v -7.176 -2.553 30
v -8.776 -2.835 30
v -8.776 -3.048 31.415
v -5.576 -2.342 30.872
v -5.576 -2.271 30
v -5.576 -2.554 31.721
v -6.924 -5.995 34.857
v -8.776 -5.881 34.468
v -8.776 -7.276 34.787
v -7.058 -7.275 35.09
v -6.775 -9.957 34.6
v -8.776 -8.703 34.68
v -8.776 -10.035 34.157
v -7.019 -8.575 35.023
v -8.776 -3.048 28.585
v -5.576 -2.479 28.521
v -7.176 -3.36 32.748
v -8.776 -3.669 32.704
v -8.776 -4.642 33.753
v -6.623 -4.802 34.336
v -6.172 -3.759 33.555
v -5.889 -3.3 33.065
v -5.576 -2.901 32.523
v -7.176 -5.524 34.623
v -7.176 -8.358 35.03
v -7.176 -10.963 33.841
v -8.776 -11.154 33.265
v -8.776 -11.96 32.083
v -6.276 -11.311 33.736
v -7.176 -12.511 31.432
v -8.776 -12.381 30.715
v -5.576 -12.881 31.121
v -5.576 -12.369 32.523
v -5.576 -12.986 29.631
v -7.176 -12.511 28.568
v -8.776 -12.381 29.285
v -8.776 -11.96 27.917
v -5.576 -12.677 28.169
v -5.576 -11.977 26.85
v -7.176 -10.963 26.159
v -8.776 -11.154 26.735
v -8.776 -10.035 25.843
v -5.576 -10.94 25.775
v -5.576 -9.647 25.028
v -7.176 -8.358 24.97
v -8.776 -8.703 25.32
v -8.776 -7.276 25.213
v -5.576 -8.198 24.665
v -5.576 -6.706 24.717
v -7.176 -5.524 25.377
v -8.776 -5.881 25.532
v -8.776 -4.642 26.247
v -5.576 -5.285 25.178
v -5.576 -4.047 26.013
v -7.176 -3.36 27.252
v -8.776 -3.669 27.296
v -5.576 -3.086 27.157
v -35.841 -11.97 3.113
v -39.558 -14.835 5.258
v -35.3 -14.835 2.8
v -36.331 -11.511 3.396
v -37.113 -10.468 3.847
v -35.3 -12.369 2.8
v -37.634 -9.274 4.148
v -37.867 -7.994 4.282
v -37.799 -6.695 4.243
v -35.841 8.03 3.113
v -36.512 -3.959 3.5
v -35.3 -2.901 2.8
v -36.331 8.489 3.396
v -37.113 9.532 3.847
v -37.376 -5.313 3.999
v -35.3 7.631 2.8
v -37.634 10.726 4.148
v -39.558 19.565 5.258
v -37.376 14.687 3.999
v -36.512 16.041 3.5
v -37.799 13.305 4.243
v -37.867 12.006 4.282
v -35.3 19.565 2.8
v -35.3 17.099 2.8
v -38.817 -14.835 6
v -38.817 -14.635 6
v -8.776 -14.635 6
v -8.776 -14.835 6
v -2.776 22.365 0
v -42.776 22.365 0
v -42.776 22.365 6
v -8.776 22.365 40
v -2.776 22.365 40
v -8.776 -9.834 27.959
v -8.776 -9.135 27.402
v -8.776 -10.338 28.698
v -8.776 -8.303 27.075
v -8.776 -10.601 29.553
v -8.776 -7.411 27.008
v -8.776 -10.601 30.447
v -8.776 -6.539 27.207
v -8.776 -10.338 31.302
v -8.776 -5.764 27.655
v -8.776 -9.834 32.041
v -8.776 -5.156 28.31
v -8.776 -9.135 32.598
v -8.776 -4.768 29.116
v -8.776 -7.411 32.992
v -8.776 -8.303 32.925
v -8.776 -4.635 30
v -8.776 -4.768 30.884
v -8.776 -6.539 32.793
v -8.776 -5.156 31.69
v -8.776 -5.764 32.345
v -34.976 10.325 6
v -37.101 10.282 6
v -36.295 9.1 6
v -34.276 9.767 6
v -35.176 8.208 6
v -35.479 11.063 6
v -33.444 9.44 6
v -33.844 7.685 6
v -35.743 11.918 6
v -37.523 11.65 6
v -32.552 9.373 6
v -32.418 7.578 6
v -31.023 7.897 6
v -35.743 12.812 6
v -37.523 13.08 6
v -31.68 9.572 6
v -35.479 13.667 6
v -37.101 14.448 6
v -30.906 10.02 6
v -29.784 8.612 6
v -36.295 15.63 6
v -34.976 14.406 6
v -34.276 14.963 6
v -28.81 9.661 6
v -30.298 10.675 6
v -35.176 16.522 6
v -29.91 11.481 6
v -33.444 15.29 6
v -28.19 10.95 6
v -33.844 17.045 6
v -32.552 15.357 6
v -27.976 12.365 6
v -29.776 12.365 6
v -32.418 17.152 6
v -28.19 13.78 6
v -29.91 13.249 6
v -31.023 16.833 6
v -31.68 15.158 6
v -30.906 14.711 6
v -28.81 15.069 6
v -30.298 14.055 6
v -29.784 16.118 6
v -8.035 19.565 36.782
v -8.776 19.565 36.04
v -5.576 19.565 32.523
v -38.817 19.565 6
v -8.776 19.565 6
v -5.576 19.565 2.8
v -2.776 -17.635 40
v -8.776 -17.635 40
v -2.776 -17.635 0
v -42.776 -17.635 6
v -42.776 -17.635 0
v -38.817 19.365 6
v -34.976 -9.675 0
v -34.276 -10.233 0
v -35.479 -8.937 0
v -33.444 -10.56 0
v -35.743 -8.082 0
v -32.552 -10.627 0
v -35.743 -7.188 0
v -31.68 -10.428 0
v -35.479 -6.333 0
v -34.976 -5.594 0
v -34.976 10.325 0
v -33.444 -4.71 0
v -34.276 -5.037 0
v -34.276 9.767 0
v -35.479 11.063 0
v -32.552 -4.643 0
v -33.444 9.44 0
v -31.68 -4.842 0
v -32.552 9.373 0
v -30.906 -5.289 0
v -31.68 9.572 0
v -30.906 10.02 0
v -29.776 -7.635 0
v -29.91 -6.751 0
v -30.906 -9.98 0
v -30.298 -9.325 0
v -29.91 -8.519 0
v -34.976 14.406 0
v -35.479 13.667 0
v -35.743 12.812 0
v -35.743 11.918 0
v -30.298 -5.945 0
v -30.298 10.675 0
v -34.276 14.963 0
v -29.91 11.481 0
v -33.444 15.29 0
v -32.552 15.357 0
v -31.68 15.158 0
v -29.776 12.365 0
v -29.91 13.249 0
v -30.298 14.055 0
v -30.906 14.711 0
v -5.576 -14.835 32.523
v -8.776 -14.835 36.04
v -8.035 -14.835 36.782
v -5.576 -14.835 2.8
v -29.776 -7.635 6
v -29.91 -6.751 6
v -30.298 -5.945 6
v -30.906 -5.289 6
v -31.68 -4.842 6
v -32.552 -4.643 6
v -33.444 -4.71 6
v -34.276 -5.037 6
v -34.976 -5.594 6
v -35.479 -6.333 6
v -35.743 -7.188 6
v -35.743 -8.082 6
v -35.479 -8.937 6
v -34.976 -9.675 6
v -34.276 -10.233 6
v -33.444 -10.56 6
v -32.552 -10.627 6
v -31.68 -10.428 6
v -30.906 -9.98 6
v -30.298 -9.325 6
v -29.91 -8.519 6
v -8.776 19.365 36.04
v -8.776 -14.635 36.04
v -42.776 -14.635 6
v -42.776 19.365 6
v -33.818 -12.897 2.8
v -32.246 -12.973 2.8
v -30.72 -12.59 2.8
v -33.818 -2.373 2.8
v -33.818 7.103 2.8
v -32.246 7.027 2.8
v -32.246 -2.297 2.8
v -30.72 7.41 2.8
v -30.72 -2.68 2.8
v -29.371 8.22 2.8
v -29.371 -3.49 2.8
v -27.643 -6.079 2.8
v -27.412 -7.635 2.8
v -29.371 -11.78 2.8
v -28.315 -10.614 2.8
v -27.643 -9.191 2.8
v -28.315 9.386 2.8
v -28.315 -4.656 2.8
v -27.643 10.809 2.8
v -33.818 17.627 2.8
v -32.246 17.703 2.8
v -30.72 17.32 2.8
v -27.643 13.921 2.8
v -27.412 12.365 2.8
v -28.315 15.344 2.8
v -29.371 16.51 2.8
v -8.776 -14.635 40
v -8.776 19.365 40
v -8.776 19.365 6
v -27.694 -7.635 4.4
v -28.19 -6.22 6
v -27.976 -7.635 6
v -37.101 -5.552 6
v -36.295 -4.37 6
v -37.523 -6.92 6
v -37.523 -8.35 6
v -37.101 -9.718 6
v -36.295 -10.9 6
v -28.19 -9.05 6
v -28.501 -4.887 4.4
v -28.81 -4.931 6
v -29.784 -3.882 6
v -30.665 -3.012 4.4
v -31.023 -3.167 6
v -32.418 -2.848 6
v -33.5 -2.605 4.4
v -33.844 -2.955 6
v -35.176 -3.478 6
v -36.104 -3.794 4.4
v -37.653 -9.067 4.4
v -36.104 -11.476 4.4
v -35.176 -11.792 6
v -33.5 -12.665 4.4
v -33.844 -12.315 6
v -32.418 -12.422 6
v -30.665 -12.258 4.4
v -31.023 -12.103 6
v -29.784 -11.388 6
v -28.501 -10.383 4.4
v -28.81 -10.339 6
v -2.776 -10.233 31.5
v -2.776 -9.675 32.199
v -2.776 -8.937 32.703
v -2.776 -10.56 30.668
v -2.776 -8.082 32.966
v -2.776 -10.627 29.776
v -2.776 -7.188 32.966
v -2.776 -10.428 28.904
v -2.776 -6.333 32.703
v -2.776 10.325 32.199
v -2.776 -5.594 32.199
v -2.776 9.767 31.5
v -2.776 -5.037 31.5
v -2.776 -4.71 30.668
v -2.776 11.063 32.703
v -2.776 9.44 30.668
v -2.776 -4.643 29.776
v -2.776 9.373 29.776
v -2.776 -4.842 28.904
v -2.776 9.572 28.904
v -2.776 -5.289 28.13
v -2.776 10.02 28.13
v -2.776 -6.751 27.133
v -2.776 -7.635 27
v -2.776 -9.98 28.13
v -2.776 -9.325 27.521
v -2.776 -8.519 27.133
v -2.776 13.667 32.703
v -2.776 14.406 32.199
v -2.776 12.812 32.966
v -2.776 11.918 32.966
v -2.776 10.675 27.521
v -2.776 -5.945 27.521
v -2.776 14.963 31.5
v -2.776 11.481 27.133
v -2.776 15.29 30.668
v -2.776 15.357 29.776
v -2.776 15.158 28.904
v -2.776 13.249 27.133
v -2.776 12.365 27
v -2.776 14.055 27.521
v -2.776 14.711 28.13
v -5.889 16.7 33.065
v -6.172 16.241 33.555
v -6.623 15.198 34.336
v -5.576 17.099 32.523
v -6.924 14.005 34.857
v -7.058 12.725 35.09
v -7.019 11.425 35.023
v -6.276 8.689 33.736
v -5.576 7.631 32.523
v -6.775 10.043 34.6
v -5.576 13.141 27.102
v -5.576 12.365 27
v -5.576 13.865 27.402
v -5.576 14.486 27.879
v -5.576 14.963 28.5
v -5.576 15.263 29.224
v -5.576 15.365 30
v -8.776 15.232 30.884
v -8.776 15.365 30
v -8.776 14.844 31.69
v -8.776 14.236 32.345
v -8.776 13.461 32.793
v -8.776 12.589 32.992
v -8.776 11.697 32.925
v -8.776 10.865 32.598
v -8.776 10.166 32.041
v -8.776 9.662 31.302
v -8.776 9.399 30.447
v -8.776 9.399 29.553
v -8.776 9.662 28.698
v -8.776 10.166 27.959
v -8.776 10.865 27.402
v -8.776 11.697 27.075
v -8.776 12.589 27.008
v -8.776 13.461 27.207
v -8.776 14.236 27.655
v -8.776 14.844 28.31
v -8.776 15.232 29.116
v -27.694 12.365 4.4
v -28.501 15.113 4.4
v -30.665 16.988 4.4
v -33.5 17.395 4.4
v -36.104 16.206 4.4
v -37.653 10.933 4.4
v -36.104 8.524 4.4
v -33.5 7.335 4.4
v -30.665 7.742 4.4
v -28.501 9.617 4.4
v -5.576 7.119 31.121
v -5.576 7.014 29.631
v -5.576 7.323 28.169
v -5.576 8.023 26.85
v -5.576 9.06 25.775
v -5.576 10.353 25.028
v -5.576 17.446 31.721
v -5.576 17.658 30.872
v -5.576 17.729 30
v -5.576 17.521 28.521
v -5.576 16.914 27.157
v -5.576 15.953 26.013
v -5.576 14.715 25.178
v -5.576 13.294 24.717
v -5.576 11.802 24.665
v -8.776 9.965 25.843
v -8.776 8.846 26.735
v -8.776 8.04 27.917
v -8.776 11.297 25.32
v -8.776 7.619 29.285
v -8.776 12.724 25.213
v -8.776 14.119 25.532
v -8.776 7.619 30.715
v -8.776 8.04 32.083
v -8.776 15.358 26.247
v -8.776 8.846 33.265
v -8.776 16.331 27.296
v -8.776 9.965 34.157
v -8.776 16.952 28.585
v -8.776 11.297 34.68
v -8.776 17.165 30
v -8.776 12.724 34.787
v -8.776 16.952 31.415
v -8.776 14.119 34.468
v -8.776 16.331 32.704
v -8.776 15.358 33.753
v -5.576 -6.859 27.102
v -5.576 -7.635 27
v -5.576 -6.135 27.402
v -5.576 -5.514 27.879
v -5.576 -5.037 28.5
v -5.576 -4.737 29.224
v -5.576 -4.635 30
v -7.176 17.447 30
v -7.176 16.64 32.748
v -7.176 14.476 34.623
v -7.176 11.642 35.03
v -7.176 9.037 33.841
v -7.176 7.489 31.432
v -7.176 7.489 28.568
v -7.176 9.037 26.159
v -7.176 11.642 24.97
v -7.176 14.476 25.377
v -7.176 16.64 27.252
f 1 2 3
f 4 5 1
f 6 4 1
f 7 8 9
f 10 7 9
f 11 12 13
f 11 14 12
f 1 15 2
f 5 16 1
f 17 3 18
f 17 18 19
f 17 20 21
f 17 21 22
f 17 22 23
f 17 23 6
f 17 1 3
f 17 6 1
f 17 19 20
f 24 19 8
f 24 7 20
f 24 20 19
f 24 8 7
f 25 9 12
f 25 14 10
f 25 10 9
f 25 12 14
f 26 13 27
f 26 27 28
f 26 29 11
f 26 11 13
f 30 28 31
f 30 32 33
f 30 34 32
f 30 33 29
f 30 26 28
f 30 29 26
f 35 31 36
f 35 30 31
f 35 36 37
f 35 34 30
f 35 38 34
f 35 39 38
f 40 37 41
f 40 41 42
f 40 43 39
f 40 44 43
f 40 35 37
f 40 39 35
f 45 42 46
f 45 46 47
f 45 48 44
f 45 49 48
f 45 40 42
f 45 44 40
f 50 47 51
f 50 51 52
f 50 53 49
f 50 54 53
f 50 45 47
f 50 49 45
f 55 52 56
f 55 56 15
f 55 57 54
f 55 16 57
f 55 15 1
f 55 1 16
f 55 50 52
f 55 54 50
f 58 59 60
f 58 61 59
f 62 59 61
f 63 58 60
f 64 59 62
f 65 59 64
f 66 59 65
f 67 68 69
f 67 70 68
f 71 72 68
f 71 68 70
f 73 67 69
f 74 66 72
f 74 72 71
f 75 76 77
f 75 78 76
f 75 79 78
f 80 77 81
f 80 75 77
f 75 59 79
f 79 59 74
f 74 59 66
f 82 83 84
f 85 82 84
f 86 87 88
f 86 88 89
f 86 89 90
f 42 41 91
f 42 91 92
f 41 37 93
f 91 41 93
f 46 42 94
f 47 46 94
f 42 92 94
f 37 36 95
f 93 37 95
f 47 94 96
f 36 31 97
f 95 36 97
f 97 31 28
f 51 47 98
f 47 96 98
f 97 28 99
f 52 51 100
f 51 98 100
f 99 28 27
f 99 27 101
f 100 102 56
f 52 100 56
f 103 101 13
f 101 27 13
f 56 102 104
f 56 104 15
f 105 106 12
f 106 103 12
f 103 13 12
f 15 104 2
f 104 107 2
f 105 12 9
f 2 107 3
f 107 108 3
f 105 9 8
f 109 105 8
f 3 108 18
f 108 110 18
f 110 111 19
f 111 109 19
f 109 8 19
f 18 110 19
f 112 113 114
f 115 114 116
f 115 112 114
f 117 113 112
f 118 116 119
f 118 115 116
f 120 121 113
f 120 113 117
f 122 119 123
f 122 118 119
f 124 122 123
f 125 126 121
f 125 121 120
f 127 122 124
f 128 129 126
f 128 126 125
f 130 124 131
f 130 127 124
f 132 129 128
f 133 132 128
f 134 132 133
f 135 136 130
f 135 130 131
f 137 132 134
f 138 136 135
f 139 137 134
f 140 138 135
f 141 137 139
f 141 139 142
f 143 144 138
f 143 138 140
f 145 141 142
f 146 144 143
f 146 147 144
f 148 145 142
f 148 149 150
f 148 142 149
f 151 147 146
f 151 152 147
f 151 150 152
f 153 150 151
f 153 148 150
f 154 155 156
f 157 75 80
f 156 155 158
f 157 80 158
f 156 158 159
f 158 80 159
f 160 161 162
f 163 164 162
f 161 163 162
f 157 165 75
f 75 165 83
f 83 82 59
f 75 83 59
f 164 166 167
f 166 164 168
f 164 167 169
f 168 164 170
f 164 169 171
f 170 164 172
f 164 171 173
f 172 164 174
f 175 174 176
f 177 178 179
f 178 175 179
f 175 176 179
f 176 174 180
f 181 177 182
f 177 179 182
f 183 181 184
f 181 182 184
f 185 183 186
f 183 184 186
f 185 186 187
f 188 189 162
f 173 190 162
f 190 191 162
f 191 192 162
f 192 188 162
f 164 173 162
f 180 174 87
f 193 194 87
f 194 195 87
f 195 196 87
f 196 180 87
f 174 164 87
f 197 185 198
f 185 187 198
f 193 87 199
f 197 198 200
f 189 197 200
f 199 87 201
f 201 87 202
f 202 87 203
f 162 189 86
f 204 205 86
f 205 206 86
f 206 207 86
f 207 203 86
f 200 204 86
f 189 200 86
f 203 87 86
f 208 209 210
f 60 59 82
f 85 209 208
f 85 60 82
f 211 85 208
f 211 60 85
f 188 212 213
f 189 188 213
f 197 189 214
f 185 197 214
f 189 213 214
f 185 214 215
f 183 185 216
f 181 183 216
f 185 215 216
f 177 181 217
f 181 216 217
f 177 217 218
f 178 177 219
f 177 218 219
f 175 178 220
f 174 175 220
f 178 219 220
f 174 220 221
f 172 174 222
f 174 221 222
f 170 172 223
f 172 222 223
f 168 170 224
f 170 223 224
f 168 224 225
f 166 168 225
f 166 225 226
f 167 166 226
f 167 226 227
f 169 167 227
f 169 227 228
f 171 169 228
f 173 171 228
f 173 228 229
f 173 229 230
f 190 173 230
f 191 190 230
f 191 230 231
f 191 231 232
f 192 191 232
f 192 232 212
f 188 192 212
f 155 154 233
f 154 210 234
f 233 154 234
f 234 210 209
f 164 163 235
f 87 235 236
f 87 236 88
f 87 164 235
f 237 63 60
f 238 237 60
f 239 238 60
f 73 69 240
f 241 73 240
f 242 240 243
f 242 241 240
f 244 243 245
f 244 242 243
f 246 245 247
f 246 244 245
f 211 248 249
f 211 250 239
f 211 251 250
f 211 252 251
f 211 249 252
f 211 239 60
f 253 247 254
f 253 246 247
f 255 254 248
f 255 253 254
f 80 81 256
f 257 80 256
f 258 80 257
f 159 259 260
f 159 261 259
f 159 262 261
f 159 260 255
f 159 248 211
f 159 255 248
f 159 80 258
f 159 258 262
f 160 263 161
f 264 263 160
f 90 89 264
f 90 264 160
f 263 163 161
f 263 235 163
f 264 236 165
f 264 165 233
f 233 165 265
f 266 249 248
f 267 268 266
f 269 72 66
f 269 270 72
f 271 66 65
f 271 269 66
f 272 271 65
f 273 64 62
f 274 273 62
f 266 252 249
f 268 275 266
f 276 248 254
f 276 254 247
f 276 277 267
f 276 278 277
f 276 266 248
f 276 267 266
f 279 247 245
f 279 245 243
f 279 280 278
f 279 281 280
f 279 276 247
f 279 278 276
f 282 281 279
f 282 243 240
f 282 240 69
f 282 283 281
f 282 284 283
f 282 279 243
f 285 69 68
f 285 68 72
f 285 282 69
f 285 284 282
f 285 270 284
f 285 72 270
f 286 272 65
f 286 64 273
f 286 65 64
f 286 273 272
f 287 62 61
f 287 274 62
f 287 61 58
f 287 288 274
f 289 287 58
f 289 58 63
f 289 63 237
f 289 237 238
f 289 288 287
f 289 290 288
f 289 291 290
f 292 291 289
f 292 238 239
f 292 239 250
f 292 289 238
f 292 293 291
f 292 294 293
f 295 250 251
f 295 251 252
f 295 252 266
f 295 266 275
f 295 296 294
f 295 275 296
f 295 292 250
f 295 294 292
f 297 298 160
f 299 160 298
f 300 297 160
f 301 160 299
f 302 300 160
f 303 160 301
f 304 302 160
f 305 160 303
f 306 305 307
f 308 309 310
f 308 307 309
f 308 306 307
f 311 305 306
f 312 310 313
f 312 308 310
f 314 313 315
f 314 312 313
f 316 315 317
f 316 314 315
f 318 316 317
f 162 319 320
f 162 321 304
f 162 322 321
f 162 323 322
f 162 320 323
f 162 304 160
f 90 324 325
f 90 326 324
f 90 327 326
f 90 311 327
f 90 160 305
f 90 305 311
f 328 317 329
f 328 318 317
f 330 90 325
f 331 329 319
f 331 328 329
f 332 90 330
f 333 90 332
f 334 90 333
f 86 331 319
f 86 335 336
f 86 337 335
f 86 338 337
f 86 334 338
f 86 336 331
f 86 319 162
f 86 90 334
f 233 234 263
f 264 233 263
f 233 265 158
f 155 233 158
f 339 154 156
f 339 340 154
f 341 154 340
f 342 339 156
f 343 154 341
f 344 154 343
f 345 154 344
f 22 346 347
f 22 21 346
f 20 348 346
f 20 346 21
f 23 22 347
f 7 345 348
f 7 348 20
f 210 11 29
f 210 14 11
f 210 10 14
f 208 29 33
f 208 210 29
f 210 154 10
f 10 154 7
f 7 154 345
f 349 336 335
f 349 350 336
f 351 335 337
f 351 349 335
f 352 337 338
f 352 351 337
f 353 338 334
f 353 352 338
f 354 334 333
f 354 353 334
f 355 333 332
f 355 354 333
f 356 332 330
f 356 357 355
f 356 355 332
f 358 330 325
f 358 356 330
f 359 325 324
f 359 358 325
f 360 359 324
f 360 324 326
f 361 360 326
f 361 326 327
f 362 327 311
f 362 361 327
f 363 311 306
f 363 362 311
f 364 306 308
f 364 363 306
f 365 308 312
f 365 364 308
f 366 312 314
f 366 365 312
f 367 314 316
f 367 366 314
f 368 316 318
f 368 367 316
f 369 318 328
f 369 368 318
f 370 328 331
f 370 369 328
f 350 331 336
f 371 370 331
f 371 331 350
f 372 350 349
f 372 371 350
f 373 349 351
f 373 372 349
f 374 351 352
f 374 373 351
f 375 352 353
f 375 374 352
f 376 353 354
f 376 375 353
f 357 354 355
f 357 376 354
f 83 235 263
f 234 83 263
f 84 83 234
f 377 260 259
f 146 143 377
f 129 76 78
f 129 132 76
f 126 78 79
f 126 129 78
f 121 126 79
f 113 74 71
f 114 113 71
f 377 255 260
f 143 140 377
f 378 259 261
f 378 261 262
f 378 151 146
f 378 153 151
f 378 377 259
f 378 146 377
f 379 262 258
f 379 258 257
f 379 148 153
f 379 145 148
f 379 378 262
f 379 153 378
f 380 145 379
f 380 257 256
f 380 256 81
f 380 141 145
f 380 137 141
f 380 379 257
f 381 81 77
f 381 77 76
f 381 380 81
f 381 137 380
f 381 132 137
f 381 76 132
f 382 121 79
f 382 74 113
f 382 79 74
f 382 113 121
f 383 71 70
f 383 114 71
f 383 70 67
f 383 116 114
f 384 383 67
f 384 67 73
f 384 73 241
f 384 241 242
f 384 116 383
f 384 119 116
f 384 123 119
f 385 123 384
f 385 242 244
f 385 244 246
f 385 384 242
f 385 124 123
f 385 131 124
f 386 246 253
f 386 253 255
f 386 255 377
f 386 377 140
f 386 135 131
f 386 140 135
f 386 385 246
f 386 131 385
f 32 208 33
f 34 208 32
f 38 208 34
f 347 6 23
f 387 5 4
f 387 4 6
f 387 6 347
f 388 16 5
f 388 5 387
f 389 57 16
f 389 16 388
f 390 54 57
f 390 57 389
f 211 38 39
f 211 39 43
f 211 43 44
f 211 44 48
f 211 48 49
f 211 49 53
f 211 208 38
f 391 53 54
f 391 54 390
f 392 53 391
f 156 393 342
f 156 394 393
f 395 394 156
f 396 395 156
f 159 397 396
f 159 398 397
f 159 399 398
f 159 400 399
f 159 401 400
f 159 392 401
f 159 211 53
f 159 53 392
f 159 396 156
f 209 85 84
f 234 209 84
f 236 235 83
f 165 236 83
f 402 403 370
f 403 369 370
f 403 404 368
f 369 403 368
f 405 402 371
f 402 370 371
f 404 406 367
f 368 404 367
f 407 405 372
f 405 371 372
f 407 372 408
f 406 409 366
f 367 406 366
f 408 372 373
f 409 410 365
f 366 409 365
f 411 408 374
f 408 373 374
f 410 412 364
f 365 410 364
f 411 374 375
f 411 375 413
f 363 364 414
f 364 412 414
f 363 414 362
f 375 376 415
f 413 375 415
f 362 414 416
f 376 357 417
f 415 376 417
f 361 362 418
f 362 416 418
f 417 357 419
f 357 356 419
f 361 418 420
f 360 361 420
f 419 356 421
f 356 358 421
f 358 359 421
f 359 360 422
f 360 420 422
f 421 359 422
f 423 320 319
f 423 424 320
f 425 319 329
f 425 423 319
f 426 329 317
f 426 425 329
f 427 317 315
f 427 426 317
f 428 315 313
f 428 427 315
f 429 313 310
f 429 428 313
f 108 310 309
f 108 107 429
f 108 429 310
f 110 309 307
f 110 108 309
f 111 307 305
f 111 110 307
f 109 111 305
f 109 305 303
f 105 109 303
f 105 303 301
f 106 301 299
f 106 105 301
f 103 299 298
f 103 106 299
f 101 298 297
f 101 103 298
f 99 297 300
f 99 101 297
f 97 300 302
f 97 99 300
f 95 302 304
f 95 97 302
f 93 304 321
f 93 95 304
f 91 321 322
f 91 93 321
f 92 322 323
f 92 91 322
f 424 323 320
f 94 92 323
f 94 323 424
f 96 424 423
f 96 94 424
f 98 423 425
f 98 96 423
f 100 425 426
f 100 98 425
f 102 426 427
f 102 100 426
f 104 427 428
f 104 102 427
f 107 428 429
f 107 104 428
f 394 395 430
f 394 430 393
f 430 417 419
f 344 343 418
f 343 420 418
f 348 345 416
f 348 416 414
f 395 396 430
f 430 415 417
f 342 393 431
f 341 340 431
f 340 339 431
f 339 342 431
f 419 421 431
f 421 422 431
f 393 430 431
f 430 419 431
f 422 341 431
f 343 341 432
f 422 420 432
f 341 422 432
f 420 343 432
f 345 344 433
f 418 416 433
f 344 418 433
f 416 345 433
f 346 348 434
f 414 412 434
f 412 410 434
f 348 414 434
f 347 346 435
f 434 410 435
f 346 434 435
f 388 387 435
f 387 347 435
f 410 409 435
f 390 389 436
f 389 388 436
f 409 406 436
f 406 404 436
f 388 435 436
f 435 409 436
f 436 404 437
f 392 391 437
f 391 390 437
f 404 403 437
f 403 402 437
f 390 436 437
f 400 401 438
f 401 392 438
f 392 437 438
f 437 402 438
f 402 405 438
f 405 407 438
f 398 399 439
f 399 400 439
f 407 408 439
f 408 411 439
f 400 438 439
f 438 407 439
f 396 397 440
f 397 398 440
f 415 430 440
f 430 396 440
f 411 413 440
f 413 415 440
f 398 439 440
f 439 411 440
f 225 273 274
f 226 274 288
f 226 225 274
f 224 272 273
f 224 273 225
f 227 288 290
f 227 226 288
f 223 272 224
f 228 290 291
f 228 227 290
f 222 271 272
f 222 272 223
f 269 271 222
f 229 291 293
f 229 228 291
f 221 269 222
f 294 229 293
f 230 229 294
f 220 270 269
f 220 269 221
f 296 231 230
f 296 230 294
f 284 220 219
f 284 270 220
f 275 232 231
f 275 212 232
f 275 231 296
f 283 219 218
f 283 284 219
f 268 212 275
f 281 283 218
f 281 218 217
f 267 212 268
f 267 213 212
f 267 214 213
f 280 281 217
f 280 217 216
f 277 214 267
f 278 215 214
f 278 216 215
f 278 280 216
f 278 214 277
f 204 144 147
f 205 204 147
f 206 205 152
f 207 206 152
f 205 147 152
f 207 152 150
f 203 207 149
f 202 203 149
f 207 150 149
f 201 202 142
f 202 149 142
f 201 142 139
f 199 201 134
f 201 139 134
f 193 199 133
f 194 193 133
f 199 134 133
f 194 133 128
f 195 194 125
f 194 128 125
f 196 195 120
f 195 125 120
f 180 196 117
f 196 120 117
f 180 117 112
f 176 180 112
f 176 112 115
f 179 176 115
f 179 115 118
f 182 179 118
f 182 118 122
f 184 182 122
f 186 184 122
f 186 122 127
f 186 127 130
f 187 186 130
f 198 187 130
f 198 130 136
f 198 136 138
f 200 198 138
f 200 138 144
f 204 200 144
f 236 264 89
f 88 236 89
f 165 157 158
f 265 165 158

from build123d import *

# Parameters (mm, degrees)
SKETCH_1_W                         = 40
SKETCH_1_H                         = 40
EXTRUDE_1_DEPTH                    = 6
SKETCH_2_R                         = 3
CUT_EXTRUDE_1_DEPTH                = 6
PATTERN_LINEAR_1_COUNT             = 2
PATTERN_LINEAR_1_PITCH             = 20
CHAMFER_1_SIZE                     = 6
SKETCH_3_W                         = 34
SKETCH_3_H                         = 3
EXTRUDE_2_DEPTH                    = 34
CHAMFER_2_SIZE                     = 34
PATTERN_LINEAR_2_COUNT             = 2
PATTERN_LINEAR_2_PITCH             = 37
CHAMFER_2_OF_PATTERN_LINEAR_2_SIZE = 34
SHELL_START                        = 2.8
SHELL_3_OUTLINE_W                  = 3.2
SHELL_3_OUTLINE_H                  = 34.4
SHELL_3_DEPTH                      = 34.4
SHELL_3_2_OUTLINE_W                = 31.2
SHELL_3_2_OUTLINE_H                = 34.4
SHELL_3_2_OUTLINE_R                = 5.8
SHELL_3_2_DEPTH                    = 3.2
SHELL_START_2                      = -8.776349614
SHELL_3_3_OUTLINE_R                = 5.8
SHELL_3_3_OUTLINE_R_2              = 3
SHELL_3_3_DEPTH                    = 3.2
SHELL_START_3                      = -16
SHELL_3_4_DEPTH                    = 37
CHAMFER_5_SIZE                     = 5.67128182
CHAMFER_5_SIZE_2                   = 1
CHAMFER_6_SIZE                     = 5.67128182
CHAMFER_6_SIZE_2                   = 1
CHAMFER_7_SIZE                     = 2.7
CHAMFER_7_SIZE_2                   = 4.67653718


with BuildPart() as part:
    # Эскиз1 → Бобышка-Вытянуть1 (new body)
    with BuildSketch(Plane.XY):
        with Locations((-22.776349614, 2.36503856)):
            Rectangle(SKETCH_1_W, SKETCH_1_H)
    extrude(amount=EXTRUDE_1_DEPTH)

    # Эскиз2 → Вырез-Вытянуть1 (cut)
    with BuildSketch(Plane.XY.offset(6)):
        with Locations((-32.776349614, 12.36503856)):
            Circle(SKETCH_2_R)
    cut_extrude_1 = extrude(amount=-CUT_EXTRUDE_1_DEPTH, mode=Mode.SUBTRACT)

    # Линейный массив1: Вырез-Вытянуть1 ×2
    with Locations(*[(0, -i * PATTERN_LINEAR_1_PITCH, 0) for i in range(1, PATTERN_LINEAR_1_COUNT)]):
        add(cut_extrude_1, mode=Mode.SUBTRACT)

    # Фаска1
    chamfer_1_edges = [part.edges().sort_by_distance(p)[0] for p in [
        (-2.776349614, 2.36503856, 6),
    ]]
    chamfer(chamfer_1_edges, length=CHAMFER_1_SIZE - 0.0001)  # a hair under: the kernel refuses the full size

    # Зеркальное отражение1: part across plane


with BuildPart() as part_1:
    add(part.part)
    add(part.part.mirror(Plane(origin=(-8.776349614, 0, 6), x_dir=(-0.7071067811865465, 0, 0.7071067811865486), z_dir=(0.7071067811865488, 0, 0.7071067811865464))))

    # Эскиз3 → Бобышка-Вытянуть2 (add)
    with BuildSketch(Plane.XY.offset(6)):
        with Locations((-25.776349614, 20.86503856)):
            Rectangle(SKETCH_3_W, SKETCH_3_H)
    extrude_2 = extrude(amount=EXTRUDE_2_DEPTH)

    # Фаска2
    chamfer_2_edges = [part_1.edges().sort_by_distance(p)[0] for p in [
        (-42.776349614, 20.86503856, 40),
    ]]
    chamfer(chamfer_2_edges, length=CHAMFER_2_SIZE)

    # Линейный массив2: Бобышка-Вытянуть2 ×2
    with Locations(*[(0, -i * PATTERN_LINEAR_2_PITCH, 0) for i in range(1, PATTERN_LINEAR_2_COUNT)]):
        add(extrude_2)

    # Фаска2 of Линейный массив2
    chamfer_2_of_pattern_linear_2_edges = [part_1.edges().sort_by_distance(p)[0] for p in [
        (-42.776349614, -16.13496144, 40),
    ]]
    chamfer(chamfer_2_of_pattern_linear_2_edges, length=CHAMFER_2_OF_PATTERN_LINEAR_2_SIZE)

    # Оболочка3: read off the stored shape, not the designer's step
    # Оболочка3 outline → Оболочка3 (cut)
    with BuildSketch(Plane.XY.offset(SHELL_START)):
        with Locations((-7.176349614, 2.36503856)):
            Rectangle(SHELL_3_OUTLINE_W, SHELL_3_OUTLINE_H)
    extrude(amount=SHELL_3_DEPTH, mode=Mode.SUBTRACT)

    # Shell 3 2 outline → Shell 3 2 (cut)
    with BuildSketch(Plane.XY.offset(SHELL_START)):
        with Locations((-24.376349614, 2.36503856)):
            Rectangle(SHELL_3_2_OUTLINE_W, SHELL_3_2_OUTLINE_H)
        with Locations((-32.776349614, -7.63496144)):
            Circle(SHELL_3_2_OUTLINE_R, mode=Mode.SUBTRACT)
        with Locations((-32.776349614, 12.36503856)):
            Circle(SHELL_3_2_OUTLINE_R, mode=Mode.SUBTRACT)
    extrude(amount=SHELL_3_2_DEPTH, mode=Mode.SUBTRACT)

    # Shell 3 3 outline → Shell 3 3 (add)
    # profile 1 of 2: a face of its own
    with BuildSketch(Plane.YZ.offset(SHELL_START_2)):
        with Locations((12.36503856, 30)):
            Circle(SHELL_3_3_OUTLINE_R)
        with Locations((12.36503856, 30)):
            Circle(SHELL_3_3_OUTLINE_R_2, mode=Mode.SUBTRACT)
    # profile 2 of 2: a face of its own
    with BuildSketch(Plane.YZ.offset(SHELL_START_2)):
        with Locations((-7.63496144, 30)):
            Circle(SHELL_3_3_OUTLINE_R)
        with Locations((-7.63496144, 30)):
            Circle(SHELL_3_3_OUTLINE_R_2, mode=Mode.SUBTRACT)
    extrude(amount=SHELL_3_3_DEPTH)

    # Shell 3 4 outline → Shell 3 4 (add)
    with BuildSketch(Plane(origin=(0, 0, 0), x_dir=(1, 0, 0), z_dir=(0, 1, 0)).offset(SHELL_START_3)):
        Polygon((-39.976349614, -4.840202025), (-39.976349614, -6), (-38.81655164, -6), align=None)
        Polygon((-7.61655164, -37.2), (-8.776349614, -36.040202025), (-8.776349614, -37.2), align=None)
    extrude(amount=SHELL_3_4_DEPTH)

    # Фаска5
    # the kernel refuses this chamfer: 5.67128182, 1 mm, written as the material it takes off along each edge
    with BuildSketch(Plane(origin=(-8.776349614, 12.36503856, 30), x_dir=(0, 1, 0), z_dir=(0, 0, -1))) as chamfer_5_piece_1_section:
        Polygon((5.8, CHAMFER_5_SIZE), (5.8 - CHAMFER_5_SIZE_2, 0), (5.8, 0), align=None)
    chamfer_5_piece_1 = revolve(axis=Axis((-8.776349614, 12.36503856, 30), (1, 0, 0)), mode=Mode.PRIVATE)
    chamfer_5_piece_1 = split(chamfer_5_piece_1, bisect_by=Plane(origin=(-5.576349614, 12.36503856, 30), z_dir=(-1, 0, 0)), keep=Keep.TOP, mode=Mode.PRIVATE)
    add(chamfer_5_piece_1, mode=Mode.SUBTRACT)
    with BuildSketch(Plane(origin=(-8.776349614, -7.63496144, 30), x_dir=(0, 1, 0), z_dir=(0, 0, -1))) as chamfer_5_piece_2_section:
        Polygon((5.8 - CHAMFER_5_SIZE_2, 0), (5.8, CHAMFER_5_SIZE), (5.8, 0), align=None)
    chamfer_5_piece_2 = revolve(axis=Axis((-8.776349614, -7.63496144, 30), (1, 0, 0)), mode=Mode.PRIVATE)
    chamfer_5_piece_2 = split(chamfer_5_piece_2, bisect_by=Plane(origin=(-5.576349614, -7.63496144, 30), z_dir=(-1, 0, 0)), keep=Keep.TOP, mode=Mode.PRIVATE)
    add(chamfer_5_piece_2, mode=Mode.SUBTRACT)

    # Фаска6
    # the kernel refuses this chamfer: 5.67128182, 1 mm, written as the material it takes off along each edge
    with BuildSketch(Plane(origin=(-32.776349614, -7.63496144, 6), x_dir=(1, 0, 0), z_dir=(0, -1, 0))) as chamfer_6_piece_1_section:
        Polygon((5.8, -CHAMFER_6_SIZE), (5.8 - CHAMFER_6_SIZE_2, 0), (5.8, 0), align=None)
    chamfer_6_piece_1 = revolve(axis=Axis((-32.776349614, -7.63496144, 6), (0, 0, 1)), mode=Mode.PRIVATE)
    chamfer_6_piece_1 = split(chamfer_6_piece_1, bisect_by=Plane(origin=(-32.776349614, -7.63496144, 2.8), z_dir=(0, 0, 1)), keep=Keep.TOP, mode=Mode.PRIVATE)
    add(chamfer_6_piece_1, mode=Mode.SUBTRACT)
    with BuildSketch(Plane(origin=(-32.776349614, 12.36503856, 6), x_dir=(1, 0, 0), z_dir=(0, -1, 0))) as chamfer_6_piece_2_section:
        Polygon((5.8, -CHAMFER_6_SIZE), (5.8 - CHAMFER_6_SIZE_2, 0), (5.8, 0), align=None)
    chamfer_6_piece_2 = revolve(axis=Axis((-32.776349614, 12.36503856, 6), (0, 0, 1)), mode=Mode.PRIVATE)
    chamfer_6_piece_2 = split(chamfer_6_piece_2, bisect_by=Plane(origin=(-32.776349614, 12.36503856, 2.8), z_dir=(0, 0, 1)), keep=Keep.TOP, mode=Mode.PRIVATE)
    add(chamfer_6_piece_2, mode=Mode.SUBTRACT)

    # Фаска7
    # the kernel refuses this chamfer: 4.67653718, 2.7 mm, written as the material it adds along each edge
    with BuildSketch(Plane(origin=(-39.976349614, 19.56503856, 2.8), x_dir=(0, 0, 1), z_dir=(0, -1, 0))) as chamfer_7_piece_1_section:
        Polygon((CHAMFER_7_SIZE, 0), (0, -CHAMFER_7_SIZE_2), (0, 0), align=None)
    chamfer_7_piece_1 = extrude(amount=34.4, mode=Mode.PRIVATE)
    chamfer_7_piece_1 = chamfer_7_piece_1 - Plane(origin=(-32.776349614, -7.63496144, 2.8), x_dir=(1, 0, 0), z_dir=(0, 0, 1)) * Cylinder(3, 88, mode=Mode.PRIVATE)
    chamfer_7_piece_1 = chamfer_7_piece_1 - Plane(origin=(-32.776349614, 12.36503856, 2.8), x_dir=(1, 0, 0), z_dir=(0, 0, 1)) * Cylinder(3, 88, mode=Mode.PRIVATE)
    add(chamfer_7_piece_1)
    with BuildSketch(Plane(origin=(-5.576349614, -14.83496144, 37.2), x_dir=(-1, 0, 0), z_dir=(0, 1, 0))) as chamfer_7_piece_2_section:
        Polygon((CHAMFER_7_SIZE, 0), (0, -CHAMFER_7_SIZE_2), (0, 0), align=None)
    chamfer_7_piece_2 = extrude(amount=34.4, mode=Mode.PRIVATE)
    chamfer_7_piece_2 = chamfer_7_piece_2 - Plane(origin=(-5.576349614, -7.63496144, 30), x_dir=(0, 0, -1), z_dir=(-1, 0, 0)) * Cylinder(3, 88, mode=Mode.PRIVATE)
    chamfer_7_piece_2 = chamfer_7_piece_2 - Plane(origin=(-5.576349614, 12.36503856, 30), x_dir=(0, 0, -1), z_dir=(-1, 0, 0)) * Cylinder(3, 88, mode=Mode.PRIVATE)
    add(chamfer_7_piece_2)


solid = part_1.part
